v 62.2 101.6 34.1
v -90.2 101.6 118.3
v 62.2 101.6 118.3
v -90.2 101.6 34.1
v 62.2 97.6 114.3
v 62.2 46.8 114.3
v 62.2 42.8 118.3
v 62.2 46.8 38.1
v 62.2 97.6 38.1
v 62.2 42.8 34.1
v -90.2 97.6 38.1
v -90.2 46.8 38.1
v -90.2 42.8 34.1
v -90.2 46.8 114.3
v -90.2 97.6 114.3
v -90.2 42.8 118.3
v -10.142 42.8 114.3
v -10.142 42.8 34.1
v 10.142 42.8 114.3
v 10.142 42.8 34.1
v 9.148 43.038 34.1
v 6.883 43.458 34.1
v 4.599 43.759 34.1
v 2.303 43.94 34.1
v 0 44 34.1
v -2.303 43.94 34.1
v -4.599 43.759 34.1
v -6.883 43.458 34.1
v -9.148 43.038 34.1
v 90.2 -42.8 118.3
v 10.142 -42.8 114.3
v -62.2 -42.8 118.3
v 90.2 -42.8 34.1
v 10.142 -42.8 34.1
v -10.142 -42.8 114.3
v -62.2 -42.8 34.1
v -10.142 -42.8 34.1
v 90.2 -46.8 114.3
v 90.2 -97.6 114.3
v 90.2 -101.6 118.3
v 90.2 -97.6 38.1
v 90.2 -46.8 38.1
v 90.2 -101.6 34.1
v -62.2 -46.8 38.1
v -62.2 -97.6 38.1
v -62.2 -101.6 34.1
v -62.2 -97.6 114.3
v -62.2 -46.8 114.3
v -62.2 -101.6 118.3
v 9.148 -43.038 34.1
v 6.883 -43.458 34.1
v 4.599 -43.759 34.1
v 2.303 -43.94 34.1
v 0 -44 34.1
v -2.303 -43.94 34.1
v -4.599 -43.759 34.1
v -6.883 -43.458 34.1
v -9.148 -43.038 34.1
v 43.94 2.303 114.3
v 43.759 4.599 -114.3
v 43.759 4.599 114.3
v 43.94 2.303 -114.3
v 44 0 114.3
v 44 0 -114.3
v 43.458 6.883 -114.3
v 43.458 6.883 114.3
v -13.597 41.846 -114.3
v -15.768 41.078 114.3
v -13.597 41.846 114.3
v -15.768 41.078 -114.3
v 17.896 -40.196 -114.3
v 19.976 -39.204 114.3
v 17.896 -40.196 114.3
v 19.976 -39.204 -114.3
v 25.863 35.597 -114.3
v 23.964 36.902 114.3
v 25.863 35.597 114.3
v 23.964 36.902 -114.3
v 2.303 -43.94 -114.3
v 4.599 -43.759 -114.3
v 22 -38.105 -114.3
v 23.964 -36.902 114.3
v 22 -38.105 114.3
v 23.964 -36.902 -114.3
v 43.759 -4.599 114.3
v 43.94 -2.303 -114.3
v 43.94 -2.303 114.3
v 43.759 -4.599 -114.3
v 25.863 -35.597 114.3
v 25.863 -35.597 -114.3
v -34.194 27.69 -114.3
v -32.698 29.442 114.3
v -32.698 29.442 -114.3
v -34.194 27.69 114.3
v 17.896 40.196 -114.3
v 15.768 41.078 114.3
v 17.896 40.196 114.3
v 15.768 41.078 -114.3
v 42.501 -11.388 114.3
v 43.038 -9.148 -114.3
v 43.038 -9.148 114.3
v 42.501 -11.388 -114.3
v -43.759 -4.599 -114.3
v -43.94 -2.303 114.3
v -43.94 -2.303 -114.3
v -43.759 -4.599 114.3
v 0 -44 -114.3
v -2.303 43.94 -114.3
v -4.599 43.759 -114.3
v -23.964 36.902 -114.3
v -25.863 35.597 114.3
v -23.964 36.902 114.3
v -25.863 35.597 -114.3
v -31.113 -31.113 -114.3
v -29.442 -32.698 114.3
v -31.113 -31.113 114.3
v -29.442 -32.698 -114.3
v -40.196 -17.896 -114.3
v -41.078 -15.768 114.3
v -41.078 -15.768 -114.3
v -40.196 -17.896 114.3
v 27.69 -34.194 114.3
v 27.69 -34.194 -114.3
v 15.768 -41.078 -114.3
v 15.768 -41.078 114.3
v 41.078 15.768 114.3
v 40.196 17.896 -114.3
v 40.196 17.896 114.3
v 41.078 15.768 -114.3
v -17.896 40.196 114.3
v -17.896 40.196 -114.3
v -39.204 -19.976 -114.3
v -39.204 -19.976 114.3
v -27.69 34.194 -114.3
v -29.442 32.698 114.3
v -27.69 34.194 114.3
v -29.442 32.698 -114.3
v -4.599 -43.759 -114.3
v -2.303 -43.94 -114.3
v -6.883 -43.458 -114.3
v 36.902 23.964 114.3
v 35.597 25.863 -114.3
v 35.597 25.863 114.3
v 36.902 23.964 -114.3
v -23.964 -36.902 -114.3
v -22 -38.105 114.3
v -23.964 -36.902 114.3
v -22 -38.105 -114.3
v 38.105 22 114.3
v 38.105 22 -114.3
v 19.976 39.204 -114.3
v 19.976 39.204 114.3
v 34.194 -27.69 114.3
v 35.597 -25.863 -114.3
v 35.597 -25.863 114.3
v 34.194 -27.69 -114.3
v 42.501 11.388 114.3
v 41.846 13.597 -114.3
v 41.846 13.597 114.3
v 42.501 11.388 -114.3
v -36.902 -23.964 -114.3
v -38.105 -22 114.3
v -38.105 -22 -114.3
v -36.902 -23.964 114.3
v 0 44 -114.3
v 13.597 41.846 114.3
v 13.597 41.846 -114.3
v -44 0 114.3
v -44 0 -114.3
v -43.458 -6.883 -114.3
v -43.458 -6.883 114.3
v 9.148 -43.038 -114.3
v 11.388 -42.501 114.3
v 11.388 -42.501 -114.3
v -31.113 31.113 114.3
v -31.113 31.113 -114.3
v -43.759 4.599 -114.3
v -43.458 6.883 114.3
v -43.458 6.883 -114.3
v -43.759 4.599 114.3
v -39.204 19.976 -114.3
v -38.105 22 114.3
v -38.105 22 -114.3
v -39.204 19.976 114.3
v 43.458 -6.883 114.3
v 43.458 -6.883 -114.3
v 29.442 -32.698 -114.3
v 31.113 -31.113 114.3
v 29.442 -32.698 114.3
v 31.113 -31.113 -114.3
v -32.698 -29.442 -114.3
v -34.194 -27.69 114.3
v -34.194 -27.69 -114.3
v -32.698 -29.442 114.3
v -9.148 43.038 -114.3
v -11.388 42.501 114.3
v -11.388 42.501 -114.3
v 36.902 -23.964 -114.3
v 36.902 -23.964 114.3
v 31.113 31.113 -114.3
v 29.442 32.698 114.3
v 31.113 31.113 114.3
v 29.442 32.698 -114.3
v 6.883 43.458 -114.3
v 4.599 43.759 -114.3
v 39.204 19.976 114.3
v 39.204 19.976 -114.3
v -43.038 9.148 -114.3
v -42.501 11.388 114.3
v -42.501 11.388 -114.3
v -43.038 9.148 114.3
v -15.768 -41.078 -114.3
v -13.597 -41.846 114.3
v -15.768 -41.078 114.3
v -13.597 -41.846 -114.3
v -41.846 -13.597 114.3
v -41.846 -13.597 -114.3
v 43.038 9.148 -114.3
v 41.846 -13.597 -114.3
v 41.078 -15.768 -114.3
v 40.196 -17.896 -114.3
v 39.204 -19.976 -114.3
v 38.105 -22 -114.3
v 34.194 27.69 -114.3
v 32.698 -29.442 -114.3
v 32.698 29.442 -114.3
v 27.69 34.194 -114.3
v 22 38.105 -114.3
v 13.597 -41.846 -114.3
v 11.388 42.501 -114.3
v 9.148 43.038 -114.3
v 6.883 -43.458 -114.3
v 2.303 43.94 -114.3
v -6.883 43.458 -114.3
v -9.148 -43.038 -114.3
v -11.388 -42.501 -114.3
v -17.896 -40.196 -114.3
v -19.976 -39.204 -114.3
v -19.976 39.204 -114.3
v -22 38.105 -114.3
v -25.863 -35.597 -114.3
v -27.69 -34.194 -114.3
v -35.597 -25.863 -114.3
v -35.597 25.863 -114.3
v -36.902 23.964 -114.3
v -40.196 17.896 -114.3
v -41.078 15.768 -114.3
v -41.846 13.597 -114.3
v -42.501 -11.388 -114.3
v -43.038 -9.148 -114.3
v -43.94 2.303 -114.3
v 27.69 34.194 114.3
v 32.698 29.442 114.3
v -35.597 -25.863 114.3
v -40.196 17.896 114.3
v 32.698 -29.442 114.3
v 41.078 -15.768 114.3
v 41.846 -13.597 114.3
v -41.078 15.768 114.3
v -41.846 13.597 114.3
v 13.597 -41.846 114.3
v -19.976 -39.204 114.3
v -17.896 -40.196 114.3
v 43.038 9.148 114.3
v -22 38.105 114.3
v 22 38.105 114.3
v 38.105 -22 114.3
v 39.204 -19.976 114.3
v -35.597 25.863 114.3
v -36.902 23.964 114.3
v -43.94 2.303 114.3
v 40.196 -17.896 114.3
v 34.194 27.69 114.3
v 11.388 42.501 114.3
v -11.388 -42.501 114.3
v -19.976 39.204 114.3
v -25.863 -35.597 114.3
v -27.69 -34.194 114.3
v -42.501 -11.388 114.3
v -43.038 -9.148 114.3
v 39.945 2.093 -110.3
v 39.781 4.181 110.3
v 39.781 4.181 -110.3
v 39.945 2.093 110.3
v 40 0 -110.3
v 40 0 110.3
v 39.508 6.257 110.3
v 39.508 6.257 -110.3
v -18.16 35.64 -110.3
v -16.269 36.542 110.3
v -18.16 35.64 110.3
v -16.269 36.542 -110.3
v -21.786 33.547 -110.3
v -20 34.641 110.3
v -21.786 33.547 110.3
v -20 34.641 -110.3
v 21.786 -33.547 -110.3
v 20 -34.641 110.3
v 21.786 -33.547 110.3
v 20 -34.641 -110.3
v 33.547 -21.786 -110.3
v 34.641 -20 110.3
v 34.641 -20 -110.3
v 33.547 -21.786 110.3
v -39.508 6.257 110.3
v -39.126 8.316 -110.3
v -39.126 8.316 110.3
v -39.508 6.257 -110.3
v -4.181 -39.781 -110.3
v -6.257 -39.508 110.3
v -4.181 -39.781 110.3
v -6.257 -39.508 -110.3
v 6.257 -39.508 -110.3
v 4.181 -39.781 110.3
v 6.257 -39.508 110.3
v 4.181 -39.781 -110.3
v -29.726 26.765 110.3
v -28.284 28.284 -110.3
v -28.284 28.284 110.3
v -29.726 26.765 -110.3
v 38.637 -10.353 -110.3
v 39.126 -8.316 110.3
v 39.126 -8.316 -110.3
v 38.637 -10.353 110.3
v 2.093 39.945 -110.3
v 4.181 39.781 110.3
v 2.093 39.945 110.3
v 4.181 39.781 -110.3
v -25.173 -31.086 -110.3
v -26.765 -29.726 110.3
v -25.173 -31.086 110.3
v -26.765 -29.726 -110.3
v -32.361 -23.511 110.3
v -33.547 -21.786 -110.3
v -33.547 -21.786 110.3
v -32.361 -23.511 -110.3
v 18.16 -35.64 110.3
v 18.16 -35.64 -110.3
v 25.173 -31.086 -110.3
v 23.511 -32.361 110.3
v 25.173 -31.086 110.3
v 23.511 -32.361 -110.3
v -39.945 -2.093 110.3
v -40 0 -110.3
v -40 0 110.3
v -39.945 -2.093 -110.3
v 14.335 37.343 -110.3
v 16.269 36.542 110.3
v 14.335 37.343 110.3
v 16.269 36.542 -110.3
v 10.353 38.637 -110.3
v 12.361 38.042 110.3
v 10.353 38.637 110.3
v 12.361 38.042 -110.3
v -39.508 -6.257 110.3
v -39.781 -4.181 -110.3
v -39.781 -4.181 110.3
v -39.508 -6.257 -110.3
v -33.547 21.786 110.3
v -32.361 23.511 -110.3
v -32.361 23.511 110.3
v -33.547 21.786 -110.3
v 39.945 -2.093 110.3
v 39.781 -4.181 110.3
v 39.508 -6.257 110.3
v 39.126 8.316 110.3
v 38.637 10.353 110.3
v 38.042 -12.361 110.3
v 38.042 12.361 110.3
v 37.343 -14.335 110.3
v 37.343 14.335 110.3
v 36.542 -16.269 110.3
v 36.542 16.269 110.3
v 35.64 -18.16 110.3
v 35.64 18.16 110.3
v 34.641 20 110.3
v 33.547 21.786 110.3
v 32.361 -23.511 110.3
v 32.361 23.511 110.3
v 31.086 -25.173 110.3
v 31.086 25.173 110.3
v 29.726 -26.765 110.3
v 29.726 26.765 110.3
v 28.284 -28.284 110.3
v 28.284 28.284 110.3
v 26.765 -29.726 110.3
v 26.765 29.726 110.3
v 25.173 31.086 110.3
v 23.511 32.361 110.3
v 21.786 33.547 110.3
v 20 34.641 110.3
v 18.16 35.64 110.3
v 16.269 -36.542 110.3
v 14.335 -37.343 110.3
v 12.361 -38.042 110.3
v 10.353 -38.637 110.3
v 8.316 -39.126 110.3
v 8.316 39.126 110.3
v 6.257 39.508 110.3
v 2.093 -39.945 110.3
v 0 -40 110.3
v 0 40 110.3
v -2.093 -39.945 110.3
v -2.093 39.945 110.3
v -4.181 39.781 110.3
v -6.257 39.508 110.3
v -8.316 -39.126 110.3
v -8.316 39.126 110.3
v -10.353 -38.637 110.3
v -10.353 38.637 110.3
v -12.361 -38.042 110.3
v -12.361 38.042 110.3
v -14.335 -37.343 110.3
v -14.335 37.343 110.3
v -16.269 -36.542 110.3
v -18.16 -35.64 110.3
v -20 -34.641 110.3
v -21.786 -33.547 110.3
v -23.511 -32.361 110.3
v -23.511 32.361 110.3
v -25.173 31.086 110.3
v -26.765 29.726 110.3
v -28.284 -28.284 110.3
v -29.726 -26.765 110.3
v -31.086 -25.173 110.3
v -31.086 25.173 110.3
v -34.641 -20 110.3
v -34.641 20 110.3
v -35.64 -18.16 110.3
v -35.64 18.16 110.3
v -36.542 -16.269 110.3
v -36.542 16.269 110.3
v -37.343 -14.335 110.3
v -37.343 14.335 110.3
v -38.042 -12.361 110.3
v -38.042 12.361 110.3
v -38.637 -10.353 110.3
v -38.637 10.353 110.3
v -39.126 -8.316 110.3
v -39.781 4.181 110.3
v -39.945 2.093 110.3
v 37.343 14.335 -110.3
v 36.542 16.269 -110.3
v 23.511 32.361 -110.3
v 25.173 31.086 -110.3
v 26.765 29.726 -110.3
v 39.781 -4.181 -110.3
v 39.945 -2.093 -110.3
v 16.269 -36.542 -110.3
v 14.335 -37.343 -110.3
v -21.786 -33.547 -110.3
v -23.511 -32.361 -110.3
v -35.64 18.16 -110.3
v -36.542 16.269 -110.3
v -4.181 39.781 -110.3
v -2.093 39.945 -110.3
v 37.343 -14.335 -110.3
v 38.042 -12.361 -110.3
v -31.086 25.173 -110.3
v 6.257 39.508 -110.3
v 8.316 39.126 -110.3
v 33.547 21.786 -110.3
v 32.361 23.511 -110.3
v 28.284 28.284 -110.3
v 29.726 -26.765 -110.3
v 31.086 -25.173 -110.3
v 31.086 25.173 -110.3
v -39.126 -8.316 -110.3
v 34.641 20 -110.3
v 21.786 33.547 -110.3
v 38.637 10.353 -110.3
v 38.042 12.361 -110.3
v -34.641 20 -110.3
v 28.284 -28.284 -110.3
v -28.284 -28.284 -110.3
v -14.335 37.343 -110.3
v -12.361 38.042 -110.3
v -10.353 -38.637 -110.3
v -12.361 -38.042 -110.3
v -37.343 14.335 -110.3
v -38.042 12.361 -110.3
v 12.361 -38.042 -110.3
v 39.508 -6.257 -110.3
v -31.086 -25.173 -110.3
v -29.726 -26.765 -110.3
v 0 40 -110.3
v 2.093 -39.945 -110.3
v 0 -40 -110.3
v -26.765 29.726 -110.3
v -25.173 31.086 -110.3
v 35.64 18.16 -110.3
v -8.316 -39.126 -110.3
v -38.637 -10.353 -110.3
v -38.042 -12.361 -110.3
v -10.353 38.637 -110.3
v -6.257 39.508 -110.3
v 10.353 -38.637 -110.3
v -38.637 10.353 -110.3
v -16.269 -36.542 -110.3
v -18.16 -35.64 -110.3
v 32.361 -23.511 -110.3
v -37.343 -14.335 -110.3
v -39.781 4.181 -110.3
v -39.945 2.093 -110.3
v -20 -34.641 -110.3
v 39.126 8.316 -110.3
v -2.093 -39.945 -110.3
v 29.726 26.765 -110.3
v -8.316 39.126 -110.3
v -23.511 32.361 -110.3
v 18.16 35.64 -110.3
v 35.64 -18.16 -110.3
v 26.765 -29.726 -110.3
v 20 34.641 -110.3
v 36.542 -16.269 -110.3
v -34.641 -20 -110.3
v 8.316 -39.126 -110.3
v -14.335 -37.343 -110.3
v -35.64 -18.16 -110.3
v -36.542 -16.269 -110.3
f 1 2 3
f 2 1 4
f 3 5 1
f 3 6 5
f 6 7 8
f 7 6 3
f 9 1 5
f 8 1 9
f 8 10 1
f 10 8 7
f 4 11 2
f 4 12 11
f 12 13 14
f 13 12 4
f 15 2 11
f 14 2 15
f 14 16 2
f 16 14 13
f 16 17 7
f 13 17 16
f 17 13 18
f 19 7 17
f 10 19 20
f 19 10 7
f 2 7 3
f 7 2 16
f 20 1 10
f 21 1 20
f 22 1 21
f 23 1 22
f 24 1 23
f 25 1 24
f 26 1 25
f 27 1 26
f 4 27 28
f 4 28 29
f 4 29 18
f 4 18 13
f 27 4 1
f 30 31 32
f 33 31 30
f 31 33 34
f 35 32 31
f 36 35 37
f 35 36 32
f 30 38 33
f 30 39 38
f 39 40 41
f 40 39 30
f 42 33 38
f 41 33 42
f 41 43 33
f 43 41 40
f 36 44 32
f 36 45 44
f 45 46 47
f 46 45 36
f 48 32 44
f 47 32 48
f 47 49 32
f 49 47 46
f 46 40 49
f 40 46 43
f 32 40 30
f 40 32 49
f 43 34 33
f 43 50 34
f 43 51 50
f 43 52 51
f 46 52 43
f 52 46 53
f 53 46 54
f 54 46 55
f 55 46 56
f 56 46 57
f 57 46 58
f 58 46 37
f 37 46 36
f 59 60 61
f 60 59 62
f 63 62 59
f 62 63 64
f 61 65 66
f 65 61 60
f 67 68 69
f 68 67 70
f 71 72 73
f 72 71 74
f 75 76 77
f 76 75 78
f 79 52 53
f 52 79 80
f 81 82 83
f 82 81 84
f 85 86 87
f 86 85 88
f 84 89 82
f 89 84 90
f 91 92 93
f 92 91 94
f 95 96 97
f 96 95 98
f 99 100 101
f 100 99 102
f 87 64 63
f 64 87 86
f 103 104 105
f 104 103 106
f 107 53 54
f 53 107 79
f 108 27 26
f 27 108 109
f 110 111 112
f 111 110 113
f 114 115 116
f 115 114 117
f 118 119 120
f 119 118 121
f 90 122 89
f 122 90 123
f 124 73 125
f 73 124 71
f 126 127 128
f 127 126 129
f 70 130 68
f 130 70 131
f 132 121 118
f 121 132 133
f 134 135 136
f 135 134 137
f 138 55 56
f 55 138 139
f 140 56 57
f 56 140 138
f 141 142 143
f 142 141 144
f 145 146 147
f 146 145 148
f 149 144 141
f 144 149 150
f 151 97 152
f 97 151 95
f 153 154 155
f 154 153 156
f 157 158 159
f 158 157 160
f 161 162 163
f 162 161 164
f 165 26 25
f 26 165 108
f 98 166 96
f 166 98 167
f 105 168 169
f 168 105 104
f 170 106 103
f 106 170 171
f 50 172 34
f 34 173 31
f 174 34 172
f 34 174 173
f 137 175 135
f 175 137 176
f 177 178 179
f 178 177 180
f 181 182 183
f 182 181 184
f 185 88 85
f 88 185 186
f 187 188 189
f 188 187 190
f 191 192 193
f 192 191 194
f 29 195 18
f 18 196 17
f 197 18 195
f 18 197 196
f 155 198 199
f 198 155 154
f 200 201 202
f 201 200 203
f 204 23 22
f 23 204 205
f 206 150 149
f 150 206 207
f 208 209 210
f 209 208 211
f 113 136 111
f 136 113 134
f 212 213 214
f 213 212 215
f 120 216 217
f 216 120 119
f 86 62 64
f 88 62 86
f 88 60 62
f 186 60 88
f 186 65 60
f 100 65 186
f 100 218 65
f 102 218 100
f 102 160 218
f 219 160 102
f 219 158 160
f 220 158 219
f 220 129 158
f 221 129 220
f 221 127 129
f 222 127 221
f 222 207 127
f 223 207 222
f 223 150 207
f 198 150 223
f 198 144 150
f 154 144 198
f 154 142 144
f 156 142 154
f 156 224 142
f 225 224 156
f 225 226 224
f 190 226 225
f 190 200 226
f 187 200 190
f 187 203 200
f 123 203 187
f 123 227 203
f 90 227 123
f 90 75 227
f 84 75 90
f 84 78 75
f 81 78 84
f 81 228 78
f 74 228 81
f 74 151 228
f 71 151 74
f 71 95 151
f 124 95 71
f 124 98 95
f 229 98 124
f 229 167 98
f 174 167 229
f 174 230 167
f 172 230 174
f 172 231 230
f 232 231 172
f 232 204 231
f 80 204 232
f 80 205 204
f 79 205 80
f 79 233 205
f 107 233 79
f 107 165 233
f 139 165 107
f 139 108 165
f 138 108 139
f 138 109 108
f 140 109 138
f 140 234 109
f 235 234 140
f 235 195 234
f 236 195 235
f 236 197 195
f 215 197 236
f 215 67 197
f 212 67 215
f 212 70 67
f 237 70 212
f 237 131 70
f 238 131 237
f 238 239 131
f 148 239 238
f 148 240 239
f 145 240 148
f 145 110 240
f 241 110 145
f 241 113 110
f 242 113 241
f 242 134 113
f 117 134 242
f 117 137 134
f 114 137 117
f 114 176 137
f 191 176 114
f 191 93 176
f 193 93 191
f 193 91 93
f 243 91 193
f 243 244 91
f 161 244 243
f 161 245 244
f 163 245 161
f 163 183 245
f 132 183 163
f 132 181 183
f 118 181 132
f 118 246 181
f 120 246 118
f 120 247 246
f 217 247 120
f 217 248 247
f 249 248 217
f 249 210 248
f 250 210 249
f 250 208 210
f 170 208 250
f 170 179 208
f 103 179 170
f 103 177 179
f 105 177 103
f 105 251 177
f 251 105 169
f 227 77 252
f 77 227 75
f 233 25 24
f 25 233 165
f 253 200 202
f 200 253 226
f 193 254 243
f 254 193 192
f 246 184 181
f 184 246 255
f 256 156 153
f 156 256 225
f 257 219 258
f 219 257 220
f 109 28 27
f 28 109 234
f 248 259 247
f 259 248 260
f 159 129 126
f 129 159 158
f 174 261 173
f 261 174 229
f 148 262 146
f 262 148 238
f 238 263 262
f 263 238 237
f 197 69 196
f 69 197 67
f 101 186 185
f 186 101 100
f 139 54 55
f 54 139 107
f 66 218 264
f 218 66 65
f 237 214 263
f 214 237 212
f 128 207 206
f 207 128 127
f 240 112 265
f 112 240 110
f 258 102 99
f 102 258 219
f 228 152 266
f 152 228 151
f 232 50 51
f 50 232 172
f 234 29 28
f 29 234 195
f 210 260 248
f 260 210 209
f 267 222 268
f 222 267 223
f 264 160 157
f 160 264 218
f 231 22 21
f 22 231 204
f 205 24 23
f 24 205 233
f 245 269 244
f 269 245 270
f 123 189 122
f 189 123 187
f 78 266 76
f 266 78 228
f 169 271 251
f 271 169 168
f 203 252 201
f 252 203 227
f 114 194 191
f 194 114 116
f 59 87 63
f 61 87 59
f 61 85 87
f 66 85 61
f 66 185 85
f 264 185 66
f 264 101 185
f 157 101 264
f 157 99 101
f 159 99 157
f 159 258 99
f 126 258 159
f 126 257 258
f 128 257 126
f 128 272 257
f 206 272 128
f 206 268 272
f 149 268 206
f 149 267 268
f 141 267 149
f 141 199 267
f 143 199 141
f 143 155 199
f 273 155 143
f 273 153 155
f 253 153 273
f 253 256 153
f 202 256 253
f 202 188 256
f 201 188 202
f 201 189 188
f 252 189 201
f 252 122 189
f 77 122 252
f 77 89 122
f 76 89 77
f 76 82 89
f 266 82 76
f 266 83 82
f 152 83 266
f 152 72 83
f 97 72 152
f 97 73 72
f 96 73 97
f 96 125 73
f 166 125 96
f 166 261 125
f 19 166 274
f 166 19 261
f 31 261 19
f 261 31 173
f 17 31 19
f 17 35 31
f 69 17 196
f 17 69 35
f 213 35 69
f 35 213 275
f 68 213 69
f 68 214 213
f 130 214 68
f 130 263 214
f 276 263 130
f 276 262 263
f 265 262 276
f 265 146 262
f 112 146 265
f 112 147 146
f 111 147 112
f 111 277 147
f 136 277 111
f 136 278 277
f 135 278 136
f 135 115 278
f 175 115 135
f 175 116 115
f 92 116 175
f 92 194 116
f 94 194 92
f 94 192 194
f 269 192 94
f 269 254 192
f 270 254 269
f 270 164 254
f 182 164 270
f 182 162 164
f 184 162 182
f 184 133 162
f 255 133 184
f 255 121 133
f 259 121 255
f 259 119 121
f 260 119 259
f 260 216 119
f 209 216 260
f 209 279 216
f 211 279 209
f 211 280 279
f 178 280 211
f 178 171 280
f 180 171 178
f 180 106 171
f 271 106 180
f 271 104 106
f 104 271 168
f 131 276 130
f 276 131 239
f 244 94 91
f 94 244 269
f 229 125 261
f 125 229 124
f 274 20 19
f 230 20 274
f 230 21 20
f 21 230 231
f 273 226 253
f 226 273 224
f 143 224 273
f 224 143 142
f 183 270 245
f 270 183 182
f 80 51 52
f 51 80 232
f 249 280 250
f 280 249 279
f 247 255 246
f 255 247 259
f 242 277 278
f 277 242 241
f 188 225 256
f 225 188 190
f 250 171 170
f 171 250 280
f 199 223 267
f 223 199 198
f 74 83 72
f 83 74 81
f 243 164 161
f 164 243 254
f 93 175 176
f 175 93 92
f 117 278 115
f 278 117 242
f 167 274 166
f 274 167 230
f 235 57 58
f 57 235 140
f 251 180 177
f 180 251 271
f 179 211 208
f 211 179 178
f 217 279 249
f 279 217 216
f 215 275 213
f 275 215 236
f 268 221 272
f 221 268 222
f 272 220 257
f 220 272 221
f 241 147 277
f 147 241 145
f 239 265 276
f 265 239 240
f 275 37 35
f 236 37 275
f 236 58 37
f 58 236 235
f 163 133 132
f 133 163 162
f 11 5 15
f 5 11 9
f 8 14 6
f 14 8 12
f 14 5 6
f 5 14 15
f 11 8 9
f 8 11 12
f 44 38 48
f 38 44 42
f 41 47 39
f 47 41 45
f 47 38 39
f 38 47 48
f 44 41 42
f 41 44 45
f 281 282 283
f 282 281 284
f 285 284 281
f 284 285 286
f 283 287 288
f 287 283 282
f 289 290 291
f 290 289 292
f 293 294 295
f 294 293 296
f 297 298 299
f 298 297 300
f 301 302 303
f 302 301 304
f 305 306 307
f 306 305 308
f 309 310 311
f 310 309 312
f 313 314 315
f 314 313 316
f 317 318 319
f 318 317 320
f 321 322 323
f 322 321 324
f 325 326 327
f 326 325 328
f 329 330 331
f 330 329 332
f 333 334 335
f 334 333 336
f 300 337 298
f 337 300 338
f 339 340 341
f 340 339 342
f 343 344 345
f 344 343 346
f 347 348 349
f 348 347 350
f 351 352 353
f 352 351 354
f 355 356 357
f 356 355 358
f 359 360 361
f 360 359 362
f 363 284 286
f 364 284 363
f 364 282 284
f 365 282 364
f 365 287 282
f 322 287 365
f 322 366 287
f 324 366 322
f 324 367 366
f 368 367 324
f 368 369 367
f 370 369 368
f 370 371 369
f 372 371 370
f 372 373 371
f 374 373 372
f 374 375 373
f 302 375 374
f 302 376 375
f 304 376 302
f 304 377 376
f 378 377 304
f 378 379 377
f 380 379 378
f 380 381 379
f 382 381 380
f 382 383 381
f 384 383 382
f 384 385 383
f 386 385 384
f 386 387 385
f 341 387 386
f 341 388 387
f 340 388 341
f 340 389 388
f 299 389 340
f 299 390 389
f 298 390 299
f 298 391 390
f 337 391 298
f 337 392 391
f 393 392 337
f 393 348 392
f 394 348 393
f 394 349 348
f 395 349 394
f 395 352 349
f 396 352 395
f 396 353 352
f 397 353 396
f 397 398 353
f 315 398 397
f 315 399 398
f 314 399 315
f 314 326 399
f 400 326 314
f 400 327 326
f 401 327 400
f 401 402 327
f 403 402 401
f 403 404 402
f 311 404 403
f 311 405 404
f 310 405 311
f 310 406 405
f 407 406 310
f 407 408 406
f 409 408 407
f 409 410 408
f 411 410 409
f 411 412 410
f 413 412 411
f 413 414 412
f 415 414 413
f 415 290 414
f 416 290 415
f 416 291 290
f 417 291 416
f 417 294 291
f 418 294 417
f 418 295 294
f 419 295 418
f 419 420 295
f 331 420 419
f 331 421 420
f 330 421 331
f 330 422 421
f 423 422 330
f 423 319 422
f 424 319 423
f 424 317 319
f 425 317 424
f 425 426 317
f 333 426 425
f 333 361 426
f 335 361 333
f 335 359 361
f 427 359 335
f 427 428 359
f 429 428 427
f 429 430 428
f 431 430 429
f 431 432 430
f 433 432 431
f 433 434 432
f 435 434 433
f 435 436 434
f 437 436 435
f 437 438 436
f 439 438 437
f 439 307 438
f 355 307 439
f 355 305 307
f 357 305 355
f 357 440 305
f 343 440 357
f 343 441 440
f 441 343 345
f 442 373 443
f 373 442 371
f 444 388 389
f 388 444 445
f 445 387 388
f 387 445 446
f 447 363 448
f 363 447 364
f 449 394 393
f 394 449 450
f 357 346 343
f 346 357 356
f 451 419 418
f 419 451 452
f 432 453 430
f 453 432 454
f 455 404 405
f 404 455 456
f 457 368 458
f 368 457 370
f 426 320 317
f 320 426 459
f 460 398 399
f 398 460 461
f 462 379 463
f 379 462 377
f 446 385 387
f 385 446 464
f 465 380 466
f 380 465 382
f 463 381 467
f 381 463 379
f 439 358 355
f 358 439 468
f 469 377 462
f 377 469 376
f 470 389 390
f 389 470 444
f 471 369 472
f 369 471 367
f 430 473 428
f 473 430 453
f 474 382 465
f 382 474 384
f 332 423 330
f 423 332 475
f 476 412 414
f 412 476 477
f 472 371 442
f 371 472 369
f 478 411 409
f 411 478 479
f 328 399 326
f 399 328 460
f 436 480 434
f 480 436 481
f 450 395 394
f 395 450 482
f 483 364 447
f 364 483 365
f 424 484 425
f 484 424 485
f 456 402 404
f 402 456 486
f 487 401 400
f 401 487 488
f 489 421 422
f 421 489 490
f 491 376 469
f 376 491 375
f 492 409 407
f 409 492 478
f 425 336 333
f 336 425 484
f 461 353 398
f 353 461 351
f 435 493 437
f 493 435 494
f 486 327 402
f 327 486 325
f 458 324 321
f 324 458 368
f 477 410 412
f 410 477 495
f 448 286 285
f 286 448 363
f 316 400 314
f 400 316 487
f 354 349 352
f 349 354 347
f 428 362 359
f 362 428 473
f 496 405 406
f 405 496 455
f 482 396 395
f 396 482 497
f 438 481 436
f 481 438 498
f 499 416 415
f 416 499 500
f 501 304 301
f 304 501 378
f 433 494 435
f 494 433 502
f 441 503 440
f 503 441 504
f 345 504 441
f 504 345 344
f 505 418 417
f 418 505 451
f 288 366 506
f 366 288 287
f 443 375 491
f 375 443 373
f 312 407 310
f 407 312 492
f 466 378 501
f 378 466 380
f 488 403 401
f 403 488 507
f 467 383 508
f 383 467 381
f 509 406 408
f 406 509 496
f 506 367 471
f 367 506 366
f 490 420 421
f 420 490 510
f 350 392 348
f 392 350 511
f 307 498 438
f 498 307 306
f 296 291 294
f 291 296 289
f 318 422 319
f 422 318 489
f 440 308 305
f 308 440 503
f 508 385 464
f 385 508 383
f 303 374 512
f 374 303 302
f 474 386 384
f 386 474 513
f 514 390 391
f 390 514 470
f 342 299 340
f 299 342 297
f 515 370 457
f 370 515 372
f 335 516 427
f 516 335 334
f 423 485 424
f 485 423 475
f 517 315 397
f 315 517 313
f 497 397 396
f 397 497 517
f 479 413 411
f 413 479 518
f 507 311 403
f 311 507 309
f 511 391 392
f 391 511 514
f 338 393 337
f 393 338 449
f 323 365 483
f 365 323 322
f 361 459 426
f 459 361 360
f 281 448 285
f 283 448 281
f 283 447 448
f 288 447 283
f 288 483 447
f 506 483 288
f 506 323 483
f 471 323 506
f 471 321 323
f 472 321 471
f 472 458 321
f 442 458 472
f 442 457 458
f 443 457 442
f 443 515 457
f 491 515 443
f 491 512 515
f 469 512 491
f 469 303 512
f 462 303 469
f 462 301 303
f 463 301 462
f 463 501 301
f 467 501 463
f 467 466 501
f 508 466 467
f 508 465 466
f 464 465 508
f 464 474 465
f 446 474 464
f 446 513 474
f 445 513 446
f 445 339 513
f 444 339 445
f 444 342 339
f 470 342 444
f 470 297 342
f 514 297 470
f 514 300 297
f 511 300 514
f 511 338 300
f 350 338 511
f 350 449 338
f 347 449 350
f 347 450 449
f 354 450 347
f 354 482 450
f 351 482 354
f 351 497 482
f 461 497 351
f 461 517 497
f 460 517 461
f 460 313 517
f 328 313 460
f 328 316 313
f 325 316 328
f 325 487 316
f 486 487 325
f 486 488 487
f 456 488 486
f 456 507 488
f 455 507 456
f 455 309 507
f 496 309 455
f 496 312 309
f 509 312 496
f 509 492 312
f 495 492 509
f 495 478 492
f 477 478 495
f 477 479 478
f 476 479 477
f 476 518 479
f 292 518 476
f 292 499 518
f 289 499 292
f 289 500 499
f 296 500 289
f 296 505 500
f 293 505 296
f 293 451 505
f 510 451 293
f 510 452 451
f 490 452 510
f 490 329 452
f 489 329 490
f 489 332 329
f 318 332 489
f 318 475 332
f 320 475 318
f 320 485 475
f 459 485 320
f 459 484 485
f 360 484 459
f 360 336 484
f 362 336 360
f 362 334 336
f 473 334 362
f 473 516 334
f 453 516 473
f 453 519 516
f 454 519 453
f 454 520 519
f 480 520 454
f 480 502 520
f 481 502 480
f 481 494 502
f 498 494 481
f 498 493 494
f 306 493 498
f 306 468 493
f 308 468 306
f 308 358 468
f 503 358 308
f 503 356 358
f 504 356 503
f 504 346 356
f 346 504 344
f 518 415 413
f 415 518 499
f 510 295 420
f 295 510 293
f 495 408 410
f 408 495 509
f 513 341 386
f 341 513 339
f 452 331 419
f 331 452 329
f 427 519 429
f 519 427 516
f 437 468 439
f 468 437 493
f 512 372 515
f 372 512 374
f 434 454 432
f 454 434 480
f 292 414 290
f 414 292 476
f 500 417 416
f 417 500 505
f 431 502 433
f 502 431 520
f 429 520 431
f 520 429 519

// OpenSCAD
use <myTools-extended.scad>
$fn = $preview ? 50 : 120;

//DEBUG= $preview ? 0 : 1;
DEBUG= 1;
//=================================================
//W = 2 * 25.4;
//L = 3 * 25.4;
W1 = 2 * 25.4;//
L1 = 3 * 25.4;

W2 = 2 * 25.4;//
L2 = 3 * 25.4;

THICK=4;
LEN = 6 * 25.4;

A = W1 * L1; //square inches of down pipe

TRUE_DIA = (2 * sqrt( A /PI));
DIA = round( TRUE_DIA + 10);  // round up to nearest 10mm

RING_DIA = DIA + 10;
RING_LEN = 10;

echo ("pipe AREA = ", A, "sq mm");
echo ("pipe DIA = ", DIA,"mm");

//              T       D        H           TRANS     ROTATE   endcap endcap               
cylinder1 = [ THICK,   DIA,      L1 * 3,     [0,0,0], [0,0,0],  DEBUG, DEBUG ]; // dia, len, translate[x,y,z]
cylinder2 = [ THICK*2, RING_DIA, RING_LEN,   [0,0,0], [0,0,0],  DEBUG, DEBUG ]; // dia, len, translate[x,y,z]

//         T        DIM              TRANS                                                     ROTATE      L  R                  
box1 = [THICK, [ W1, L1, LEN] , [  -DIA/4 + THICK*1.5,   L1-THICK/2  -THICK/2 ,    LEN/2 ], [ 90, 0, 90 ], 0, 0];
box2 = [THICK, [ W2, L2, LEN] , [   DIA/4 - THICK*1.5, -(L2-THICK/2) +THICK/2,  LEN/2 ], [ 90, 0, 90 ], 0, 0];

C_LIST = [cylinder1]; //, cylinder3, cylinder4, cylinder5, cylinder6, cylinder7, cylinder8 ]; 
BOX_LIST=[box1, box2]; //[box1, box2];

//------------------------------------------------------------

{
    difference()
    {
        union()
        {
          #make_cylinders(action="BOM", PARTS_LIST=C_LIST)
            make_cylinders(action="ADD", PARTS_LIST=C_LIST);
            //
          make_cubes("BOM", PARTS_LIST=BOX_LIST)
            make_cubes("ADD", PARTS_LIST=BOX_LIST);
        }

      union()
      {
          make_cylinders("BOM", PARTS_LIST=C_LIST)
            make_cylinders("REMOVE", PARTS_LIST=C_LIST);

          make_cubes("BOM", PARTS_LIST=BOX_LIST)
            make_cubes("REMOVE", PARTS_LIST=BOX_LIST);
      }
    } 
}
